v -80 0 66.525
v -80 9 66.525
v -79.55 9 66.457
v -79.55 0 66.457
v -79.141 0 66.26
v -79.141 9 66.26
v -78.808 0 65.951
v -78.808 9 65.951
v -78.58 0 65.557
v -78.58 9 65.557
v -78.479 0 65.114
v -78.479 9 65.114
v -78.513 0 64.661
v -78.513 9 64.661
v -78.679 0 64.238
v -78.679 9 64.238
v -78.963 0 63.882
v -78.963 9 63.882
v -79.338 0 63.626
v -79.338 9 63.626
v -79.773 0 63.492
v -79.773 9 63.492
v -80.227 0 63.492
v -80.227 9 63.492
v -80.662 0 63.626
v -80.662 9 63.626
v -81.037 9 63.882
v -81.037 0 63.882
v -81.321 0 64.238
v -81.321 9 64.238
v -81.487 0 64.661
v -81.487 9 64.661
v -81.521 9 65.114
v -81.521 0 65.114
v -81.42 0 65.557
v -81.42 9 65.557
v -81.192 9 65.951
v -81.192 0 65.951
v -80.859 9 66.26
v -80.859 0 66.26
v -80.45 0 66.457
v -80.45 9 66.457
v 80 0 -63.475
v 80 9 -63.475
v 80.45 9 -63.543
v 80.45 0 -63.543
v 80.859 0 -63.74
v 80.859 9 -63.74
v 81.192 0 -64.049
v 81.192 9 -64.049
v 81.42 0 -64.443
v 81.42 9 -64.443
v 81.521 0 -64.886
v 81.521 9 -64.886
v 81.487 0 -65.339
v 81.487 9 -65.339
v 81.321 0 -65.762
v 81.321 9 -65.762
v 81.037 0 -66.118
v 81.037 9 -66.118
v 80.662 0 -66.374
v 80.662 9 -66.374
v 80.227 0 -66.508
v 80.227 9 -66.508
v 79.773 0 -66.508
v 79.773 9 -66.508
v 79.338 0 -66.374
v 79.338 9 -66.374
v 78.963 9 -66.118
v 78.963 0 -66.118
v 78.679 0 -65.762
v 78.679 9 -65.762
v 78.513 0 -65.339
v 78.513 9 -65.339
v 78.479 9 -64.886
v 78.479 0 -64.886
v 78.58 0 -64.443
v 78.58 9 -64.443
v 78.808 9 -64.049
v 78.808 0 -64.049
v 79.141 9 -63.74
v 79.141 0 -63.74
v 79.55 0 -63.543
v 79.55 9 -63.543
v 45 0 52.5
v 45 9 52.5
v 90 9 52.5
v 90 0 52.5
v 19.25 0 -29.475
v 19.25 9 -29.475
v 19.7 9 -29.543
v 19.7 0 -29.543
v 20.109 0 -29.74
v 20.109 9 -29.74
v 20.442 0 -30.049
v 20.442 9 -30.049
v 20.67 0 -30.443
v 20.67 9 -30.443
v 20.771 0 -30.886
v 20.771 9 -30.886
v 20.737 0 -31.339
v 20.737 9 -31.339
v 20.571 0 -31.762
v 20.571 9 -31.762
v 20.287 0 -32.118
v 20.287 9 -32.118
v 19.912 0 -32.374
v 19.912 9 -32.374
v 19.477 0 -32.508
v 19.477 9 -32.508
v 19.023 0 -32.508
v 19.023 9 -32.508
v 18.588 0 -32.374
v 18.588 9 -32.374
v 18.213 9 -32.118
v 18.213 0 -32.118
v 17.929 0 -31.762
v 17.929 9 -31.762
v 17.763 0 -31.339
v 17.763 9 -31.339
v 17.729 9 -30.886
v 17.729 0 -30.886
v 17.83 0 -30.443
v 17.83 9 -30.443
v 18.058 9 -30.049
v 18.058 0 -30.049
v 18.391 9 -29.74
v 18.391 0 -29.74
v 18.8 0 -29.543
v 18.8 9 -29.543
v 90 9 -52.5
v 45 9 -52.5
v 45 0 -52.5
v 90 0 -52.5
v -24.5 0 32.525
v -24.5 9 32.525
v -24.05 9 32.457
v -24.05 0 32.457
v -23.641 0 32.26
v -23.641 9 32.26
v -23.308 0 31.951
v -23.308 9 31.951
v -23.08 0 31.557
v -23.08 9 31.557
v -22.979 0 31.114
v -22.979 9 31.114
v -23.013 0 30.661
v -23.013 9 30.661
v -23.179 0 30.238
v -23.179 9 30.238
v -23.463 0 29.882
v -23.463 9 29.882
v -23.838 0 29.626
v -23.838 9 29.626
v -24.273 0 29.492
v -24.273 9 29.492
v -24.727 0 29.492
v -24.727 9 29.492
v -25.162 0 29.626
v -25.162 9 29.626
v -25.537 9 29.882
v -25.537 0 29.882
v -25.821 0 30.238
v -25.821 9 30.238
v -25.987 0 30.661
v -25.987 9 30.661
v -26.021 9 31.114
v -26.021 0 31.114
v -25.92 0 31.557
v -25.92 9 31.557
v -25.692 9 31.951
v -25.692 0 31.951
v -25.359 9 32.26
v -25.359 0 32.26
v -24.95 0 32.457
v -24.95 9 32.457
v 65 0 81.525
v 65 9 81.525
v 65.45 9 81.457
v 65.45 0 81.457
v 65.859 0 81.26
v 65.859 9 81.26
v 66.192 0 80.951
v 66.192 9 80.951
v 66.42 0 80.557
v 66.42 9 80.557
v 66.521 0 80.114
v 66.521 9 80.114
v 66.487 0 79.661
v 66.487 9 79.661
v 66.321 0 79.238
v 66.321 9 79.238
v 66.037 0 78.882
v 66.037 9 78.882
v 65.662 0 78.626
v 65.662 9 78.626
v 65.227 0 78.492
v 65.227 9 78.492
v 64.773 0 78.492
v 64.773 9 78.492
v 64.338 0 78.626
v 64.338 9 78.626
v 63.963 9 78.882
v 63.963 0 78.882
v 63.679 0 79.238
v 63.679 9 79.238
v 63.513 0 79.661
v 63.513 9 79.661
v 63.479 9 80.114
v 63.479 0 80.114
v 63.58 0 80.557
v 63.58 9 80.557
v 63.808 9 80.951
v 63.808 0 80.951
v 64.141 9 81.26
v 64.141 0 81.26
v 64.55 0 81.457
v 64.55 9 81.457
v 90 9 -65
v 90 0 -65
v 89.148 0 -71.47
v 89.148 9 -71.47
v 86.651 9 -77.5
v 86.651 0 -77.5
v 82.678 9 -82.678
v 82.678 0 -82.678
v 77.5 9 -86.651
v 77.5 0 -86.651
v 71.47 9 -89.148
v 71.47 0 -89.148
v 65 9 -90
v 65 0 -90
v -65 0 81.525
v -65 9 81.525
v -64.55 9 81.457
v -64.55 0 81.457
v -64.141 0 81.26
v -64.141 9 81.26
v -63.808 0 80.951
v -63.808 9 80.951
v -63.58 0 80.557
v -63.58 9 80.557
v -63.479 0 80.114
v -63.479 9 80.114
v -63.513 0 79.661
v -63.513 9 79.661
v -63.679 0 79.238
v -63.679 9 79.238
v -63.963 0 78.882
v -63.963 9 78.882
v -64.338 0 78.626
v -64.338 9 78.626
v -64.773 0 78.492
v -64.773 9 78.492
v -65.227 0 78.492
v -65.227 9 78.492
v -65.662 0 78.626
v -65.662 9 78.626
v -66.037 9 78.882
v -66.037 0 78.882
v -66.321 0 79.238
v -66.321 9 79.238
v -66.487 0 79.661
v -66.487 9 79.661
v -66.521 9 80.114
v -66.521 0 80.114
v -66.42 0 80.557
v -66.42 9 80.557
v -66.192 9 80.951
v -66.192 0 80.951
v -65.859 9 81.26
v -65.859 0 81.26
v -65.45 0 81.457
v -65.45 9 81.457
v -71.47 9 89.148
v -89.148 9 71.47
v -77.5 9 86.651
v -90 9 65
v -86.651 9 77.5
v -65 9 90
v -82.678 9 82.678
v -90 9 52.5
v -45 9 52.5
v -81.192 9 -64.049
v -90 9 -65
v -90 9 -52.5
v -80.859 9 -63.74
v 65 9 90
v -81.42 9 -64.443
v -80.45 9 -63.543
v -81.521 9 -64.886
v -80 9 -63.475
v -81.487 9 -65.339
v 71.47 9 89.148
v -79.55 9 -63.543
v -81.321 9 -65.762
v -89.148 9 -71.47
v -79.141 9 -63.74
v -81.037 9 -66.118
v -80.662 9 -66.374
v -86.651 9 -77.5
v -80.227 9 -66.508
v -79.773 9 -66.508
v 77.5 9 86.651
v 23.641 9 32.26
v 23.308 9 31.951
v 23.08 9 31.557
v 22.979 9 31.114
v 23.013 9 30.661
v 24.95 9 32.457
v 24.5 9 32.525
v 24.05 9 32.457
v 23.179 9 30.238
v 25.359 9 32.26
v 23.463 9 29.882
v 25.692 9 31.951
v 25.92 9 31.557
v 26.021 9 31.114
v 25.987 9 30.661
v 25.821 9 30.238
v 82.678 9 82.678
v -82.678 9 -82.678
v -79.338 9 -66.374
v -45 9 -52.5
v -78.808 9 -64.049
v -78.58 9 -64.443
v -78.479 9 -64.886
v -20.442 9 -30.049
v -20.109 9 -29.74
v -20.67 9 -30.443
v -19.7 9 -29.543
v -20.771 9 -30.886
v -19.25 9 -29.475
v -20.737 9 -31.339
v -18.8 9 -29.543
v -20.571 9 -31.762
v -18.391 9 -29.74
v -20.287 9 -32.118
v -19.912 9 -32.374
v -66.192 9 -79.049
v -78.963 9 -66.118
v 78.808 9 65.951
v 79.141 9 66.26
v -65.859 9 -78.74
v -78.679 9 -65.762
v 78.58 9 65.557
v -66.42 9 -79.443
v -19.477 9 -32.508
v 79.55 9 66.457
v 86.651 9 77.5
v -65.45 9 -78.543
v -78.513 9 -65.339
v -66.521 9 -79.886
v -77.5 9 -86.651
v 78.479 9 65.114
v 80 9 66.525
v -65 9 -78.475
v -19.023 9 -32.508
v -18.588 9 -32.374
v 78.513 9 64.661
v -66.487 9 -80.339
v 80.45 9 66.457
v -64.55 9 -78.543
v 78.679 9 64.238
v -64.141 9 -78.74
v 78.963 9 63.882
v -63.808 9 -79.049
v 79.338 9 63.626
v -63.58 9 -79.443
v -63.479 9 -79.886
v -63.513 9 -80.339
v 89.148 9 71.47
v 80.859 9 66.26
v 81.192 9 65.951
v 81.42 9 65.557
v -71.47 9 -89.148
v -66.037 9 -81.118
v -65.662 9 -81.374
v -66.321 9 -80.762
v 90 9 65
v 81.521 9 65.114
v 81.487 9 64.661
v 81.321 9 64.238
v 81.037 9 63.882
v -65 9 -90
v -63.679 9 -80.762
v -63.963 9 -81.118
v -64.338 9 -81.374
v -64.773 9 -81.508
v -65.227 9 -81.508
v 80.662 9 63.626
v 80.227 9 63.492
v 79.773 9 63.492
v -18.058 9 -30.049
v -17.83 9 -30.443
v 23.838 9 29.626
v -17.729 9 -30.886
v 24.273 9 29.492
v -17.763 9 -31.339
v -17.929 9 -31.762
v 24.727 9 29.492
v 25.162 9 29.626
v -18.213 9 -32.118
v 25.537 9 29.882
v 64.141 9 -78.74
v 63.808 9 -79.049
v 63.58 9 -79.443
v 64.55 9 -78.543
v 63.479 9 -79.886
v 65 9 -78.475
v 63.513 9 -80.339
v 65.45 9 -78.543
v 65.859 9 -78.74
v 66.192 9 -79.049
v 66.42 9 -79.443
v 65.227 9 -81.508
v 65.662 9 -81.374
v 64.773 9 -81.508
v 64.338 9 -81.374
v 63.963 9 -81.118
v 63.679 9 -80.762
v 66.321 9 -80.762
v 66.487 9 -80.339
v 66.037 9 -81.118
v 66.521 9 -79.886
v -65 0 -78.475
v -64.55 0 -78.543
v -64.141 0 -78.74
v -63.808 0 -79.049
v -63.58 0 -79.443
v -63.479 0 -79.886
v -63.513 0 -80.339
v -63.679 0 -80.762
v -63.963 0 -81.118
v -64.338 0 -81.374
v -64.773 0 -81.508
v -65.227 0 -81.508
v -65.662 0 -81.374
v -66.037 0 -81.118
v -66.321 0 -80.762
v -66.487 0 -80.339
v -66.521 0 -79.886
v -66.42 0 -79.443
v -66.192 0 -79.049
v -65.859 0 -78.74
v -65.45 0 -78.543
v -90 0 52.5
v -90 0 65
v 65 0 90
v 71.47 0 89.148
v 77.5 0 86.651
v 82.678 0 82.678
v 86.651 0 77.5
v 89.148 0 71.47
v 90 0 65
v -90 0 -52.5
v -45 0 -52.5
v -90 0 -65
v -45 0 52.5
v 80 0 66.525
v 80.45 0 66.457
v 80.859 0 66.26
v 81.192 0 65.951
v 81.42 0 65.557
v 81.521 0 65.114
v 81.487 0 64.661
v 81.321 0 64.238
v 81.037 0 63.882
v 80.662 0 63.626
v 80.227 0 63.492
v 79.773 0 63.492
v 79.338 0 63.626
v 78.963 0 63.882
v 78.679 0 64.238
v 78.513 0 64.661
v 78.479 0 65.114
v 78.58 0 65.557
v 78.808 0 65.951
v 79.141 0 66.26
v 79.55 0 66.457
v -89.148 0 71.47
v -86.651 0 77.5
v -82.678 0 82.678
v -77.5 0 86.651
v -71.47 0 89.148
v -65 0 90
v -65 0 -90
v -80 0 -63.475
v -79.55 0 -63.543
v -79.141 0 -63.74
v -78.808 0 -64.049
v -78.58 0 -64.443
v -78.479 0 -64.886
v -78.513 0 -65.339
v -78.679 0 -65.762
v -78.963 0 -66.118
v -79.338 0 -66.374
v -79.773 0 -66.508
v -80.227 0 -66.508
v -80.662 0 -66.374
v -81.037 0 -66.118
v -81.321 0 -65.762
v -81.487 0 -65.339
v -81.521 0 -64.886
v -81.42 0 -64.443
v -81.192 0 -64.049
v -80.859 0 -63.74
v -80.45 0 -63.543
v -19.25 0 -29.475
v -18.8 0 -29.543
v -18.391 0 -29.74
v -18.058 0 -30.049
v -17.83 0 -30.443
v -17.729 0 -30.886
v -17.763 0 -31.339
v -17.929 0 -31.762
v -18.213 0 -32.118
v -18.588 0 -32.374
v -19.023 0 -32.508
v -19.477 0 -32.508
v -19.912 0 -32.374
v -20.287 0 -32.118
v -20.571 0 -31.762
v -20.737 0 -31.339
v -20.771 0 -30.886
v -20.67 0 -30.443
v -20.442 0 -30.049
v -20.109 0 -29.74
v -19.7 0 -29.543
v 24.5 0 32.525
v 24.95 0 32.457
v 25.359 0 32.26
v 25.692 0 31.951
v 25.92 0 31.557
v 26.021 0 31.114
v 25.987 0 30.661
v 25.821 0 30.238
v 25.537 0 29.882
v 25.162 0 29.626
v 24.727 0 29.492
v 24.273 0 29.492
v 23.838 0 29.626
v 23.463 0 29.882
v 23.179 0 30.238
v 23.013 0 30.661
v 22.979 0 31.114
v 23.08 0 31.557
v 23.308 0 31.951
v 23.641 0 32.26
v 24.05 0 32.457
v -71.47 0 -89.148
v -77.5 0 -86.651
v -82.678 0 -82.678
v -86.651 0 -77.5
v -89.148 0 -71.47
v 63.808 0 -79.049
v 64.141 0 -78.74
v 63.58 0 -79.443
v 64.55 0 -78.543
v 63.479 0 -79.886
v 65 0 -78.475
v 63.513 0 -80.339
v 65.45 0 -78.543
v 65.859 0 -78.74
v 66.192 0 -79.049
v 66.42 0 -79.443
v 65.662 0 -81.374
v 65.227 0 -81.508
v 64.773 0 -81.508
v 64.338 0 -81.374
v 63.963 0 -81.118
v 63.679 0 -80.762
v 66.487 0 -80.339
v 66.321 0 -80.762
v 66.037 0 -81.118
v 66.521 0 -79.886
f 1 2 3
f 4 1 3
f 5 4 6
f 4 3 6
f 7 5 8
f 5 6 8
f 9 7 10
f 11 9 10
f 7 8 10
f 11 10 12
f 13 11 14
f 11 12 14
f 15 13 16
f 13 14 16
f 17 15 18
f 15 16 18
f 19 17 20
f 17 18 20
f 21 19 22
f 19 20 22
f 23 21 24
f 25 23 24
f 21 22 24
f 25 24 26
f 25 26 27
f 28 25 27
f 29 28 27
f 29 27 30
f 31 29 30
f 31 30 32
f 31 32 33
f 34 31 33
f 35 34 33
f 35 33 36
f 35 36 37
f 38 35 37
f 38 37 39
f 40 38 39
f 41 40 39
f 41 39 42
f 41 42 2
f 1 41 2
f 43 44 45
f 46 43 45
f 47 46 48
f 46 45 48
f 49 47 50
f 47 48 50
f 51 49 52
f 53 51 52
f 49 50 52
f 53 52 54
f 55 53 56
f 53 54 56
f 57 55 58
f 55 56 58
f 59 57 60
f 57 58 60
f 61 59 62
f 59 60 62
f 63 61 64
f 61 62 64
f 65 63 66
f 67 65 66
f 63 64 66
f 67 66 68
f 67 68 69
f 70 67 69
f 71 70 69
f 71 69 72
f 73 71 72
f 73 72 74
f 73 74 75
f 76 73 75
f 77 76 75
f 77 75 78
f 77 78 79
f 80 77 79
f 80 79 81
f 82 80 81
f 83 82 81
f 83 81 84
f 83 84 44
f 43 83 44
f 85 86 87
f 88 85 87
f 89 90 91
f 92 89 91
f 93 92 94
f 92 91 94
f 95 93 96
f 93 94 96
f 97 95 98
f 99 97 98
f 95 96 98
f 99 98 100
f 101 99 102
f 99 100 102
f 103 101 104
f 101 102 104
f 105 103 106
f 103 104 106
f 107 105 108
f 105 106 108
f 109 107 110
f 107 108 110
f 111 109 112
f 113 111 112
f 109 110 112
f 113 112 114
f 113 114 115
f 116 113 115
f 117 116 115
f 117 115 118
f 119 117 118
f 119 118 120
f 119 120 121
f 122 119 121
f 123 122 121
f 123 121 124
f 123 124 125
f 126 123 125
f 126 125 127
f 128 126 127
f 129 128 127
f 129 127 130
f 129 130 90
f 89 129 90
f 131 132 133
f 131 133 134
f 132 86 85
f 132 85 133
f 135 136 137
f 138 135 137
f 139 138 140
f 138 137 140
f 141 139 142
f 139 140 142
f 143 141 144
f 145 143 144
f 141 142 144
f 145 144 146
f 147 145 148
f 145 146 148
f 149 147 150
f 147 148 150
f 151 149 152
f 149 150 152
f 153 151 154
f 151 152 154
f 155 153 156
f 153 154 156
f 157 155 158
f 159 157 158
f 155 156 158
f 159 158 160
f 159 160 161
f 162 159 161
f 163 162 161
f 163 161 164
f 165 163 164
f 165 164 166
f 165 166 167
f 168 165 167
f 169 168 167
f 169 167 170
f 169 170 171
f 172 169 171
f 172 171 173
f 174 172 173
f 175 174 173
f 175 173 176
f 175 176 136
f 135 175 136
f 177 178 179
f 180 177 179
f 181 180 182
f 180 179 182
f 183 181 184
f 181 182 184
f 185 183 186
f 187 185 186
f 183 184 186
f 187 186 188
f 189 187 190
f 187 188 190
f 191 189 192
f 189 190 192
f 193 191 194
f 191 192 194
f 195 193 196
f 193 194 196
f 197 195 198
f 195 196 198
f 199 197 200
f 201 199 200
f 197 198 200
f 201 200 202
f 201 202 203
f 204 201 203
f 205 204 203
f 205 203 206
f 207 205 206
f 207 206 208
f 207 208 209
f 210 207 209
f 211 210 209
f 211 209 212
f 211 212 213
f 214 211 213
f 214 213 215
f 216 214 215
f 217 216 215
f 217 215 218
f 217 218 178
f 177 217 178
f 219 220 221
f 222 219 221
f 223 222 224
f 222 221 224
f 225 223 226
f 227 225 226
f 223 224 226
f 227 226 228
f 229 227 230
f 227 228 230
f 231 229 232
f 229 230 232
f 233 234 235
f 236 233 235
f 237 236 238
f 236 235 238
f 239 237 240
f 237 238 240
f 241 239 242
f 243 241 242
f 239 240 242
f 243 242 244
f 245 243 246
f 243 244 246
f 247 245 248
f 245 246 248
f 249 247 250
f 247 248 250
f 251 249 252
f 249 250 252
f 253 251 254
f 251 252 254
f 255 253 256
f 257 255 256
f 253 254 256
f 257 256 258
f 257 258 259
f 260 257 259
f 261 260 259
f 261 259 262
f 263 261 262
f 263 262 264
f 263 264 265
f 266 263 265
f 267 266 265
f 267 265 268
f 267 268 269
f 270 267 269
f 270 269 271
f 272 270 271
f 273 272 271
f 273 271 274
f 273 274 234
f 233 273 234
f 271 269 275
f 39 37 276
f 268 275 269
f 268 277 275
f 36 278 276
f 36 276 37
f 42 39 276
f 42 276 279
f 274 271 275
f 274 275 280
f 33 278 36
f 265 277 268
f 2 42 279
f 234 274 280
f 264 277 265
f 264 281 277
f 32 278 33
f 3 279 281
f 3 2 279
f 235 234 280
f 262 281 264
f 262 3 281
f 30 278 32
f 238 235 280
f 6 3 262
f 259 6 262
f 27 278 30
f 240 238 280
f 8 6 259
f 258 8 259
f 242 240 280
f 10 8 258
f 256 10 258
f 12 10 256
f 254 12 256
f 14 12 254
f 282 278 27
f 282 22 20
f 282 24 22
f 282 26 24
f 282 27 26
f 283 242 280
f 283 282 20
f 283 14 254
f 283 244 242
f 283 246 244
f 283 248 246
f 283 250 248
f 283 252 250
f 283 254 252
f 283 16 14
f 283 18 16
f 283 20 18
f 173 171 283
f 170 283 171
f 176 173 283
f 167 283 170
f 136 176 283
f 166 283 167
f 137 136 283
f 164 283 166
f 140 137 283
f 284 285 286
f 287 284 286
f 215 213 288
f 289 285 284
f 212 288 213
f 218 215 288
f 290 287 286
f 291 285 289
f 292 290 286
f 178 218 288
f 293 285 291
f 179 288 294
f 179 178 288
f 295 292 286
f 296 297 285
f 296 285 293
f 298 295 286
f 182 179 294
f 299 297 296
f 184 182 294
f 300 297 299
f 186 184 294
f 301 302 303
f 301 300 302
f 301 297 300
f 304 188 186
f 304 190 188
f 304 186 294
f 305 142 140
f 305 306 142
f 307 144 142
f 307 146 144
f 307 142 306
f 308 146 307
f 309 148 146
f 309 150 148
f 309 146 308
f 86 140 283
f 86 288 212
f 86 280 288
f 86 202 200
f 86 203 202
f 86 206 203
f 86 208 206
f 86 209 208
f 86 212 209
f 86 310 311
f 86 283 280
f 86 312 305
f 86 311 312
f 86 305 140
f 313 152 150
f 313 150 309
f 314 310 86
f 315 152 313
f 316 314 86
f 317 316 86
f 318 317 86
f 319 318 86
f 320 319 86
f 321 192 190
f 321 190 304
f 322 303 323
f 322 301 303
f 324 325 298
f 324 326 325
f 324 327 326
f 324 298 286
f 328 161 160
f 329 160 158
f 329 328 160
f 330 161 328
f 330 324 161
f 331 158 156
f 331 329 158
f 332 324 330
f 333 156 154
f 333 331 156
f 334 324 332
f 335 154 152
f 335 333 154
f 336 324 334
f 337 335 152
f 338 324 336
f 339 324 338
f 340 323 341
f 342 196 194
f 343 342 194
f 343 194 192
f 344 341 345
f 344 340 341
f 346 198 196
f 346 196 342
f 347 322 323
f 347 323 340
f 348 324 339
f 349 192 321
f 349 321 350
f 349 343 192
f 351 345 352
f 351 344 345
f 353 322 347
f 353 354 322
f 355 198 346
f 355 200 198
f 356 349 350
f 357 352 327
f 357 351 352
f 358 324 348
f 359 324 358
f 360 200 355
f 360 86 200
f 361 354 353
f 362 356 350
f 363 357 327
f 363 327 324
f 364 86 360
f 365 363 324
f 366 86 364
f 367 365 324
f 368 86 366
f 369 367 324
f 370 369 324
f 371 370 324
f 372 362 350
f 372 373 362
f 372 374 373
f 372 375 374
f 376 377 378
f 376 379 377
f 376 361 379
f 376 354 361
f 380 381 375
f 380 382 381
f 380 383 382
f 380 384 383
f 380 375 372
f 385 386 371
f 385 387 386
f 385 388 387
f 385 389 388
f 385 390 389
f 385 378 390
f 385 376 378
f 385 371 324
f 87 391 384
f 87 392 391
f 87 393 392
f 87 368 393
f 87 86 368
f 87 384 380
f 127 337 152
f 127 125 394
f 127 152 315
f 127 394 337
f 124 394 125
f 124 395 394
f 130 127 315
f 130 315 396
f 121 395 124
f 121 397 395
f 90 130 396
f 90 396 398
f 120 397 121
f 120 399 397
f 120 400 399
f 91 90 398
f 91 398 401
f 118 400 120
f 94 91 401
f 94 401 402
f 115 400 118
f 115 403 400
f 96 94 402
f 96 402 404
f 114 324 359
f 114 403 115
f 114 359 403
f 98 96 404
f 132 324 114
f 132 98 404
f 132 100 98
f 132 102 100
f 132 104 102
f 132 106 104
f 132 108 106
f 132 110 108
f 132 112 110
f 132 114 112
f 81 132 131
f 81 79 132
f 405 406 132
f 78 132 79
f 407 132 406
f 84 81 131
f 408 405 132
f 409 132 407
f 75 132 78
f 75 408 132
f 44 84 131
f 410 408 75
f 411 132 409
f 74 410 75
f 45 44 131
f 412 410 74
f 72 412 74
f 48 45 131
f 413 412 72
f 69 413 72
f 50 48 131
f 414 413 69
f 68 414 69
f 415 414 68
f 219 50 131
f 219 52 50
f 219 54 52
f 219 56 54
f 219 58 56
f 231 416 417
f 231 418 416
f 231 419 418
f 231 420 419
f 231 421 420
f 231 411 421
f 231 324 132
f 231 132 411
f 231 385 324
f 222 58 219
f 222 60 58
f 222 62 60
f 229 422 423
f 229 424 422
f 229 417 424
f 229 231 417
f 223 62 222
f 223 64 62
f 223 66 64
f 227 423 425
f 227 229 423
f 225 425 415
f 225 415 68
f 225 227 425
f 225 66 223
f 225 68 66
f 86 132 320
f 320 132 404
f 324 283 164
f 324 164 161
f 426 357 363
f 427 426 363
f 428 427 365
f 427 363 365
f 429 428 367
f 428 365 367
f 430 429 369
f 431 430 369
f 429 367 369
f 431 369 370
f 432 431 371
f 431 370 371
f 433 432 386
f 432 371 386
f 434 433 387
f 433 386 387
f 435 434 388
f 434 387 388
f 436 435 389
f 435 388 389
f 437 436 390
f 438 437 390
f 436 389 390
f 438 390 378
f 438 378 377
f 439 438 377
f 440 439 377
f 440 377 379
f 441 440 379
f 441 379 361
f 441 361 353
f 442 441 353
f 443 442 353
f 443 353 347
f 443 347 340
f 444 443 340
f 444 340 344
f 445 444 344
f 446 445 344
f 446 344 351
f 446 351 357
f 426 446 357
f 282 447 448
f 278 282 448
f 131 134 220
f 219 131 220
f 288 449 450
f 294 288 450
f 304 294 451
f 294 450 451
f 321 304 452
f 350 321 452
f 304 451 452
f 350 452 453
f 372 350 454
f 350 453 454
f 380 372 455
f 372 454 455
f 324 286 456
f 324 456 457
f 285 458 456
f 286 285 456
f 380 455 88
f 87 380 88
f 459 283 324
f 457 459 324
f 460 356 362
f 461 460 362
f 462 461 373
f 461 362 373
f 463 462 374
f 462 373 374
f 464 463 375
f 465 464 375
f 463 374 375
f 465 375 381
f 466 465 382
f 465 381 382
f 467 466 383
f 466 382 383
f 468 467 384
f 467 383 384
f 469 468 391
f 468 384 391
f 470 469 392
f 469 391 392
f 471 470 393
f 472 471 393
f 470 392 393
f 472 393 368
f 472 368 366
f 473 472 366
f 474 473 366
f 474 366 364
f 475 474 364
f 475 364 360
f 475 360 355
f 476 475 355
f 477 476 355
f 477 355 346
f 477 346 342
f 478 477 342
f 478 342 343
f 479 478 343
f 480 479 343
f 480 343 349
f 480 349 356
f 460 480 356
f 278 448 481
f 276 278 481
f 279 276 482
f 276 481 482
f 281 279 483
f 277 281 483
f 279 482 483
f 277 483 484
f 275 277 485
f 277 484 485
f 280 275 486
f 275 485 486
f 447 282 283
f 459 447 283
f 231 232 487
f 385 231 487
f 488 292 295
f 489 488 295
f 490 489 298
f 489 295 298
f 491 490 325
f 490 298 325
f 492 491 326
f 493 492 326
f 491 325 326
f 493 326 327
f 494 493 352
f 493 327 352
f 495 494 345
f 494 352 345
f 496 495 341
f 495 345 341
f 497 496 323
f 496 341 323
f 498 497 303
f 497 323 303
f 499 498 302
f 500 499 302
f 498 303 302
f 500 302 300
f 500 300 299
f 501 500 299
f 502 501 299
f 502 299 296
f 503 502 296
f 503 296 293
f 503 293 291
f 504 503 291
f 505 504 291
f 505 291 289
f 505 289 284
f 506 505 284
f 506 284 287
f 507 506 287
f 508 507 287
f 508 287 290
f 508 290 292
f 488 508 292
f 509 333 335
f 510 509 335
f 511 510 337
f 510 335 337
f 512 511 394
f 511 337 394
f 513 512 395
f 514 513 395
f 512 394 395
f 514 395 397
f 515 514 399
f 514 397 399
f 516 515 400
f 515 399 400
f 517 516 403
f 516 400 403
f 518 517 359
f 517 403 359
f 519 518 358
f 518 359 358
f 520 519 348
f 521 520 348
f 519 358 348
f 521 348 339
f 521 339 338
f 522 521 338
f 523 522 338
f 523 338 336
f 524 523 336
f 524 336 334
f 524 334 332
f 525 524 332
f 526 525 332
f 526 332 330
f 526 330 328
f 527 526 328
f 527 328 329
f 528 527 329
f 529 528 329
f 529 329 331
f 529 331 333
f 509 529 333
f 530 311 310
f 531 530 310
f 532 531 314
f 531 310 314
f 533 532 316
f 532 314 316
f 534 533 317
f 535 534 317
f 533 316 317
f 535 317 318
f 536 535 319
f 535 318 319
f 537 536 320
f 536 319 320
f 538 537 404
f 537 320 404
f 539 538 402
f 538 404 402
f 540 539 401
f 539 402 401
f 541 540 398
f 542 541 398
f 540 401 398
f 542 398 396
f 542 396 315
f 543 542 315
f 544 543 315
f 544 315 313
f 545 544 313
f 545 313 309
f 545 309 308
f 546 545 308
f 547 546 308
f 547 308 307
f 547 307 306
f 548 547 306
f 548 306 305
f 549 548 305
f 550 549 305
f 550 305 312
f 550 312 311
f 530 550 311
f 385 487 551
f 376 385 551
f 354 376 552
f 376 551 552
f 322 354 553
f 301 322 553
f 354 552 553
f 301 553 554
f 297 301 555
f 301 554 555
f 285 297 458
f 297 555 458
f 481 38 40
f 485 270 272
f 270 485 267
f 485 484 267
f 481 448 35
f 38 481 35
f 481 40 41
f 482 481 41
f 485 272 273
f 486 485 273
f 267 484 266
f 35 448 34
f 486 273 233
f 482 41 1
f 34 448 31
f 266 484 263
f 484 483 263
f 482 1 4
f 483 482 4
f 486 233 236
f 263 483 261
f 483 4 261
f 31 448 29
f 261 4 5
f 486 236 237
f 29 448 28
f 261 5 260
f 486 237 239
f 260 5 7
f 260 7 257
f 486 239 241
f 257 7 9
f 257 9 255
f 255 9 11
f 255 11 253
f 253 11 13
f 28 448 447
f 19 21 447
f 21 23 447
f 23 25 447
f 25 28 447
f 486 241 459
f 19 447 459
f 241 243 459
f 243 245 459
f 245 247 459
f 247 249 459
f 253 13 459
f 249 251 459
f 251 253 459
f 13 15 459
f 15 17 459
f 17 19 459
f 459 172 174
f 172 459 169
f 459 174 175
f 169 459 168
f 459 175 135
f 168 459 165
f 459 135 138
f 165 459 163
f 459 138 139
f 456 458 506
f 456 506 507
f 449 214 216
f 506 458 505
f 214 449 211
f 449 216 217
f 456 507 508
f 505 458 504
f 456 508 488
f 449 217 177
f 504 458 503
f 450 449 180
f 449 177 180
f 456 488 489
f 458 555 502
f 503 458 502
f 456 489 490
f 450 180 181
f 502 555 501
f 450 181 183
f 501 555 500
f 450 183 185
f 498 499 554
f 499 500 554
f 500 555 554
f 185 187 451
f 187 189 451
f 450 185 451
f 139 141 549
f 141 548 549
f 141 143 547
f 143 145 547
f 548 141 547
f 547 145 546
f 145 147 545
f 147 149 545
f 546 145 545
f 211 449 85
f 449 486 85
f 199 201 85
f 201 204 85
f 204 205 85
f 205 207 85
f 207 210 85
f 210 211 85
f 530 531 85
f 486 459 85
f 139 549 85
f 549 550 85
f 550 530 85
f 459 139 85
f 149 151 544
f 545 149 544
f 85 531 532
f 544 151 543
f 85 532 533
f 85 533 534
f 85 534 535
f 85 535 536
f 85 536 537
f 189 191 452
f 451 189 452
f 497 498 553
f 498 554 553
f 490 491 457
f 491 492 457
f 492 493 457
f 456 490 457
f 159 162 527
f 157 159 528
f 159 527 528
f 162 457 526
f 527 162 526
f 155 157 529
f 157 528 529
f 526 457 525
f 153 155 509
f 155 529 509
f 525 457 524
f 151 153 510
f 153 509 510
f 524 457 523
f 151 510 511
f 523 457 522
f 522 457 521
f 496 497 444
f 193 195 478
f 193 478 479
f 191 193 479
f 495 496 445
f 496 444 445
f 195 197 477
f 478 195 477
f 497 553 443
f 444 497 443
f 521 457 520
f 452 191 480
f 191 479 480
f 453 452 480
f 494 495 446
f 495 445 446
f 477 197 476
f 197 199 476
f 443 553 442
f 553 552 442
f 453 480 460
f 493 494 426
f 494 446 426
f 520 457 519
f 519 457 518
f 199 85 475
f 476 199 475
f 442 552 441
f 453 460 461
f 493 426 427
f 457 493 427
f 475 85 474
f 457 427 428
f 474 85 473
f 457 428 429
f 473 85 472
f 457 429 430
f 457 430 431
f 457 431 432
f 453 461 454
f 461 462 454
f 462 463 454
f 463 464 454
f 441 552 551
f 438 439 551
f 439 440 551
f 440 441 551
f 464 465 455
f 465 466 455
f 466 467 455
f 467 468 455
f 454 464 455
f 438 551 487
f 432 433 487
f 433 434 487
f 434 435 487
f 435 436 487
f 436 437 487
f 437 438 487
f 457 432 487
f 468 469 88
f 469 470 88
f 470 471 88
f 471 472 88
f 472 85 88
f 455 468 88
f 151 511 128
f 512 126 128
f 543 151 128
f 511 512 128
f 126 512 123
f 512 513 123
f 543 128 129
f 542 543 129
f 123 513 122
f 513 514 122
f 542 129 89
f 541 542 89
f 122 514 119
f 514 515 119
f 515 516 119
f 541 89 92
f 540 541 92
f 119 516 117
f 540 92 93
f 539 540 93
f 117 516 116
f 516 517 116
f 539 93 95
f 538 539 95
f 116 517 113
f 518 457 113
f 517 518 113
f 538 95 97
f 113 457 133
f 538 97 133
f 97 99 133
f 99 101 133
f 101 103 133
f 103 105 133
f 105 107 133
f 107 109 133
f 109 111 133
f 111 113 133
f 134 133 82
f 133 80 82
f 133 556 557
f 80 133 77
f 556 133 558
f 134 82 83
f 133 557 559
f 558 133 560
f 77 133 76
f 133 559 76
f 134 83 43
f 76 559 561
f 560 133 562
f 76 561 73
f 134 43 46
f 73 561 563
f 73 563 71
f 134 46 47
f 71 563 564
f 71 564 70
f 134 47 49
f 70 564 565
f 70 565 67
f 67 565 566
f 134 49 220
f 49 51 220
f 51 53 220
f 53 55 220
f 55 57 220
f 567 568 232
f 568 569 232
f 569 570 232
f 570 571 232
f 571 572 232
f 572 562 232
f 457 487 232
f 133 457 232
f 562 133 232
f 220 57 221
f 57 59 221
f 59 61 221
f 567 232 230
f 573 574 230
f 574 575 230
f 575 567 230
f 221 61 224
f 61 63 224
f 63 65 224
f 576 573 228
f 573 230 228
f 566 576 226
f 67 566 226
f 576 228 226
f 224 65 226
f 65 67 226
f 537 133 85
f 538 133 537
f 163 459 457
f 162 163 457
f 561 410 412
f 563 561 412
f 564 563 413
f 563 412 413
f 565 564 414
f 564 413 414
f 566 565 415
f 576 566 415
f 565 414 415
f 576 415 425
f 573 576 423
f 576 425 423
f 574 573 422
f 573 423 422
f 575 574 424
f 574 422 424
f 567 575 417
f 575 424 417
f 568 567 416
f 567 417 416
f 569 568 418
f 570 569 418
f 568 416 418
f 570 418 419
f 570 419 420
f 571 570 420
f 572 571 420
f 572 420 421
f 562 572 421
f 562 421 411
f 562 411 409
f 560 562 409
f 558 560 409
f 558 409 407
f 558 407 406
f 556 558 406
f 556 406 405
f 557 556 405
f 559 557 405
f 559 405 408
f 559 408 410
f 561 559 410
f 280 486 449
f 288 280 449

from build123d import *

# Parameters (mm, degrees)
PLATE_DEPTH         = 9
SKETCH3_R           = 1.525
HEX_HOLES_DEPTH     = 128.597021909
SKETCH4_R           = 1.525
ARDUINO_HOLES_DEPTH = 128.597021909
SKETCH5_W           = 45
SKETCH5_H           = 105
CUT_EXTRUDE1_DEPTH  = 128.597021909


with BuildPart() as part:
    # Sketch1 → Plate (new body)
    with BuildSketch(Plane(origin=(0, 0, 0), x_dir=(1, 0, 0), z_dir=(0, 1, 0))):
        with BuildLine():
            Line((-65, -90), (65, -90))
            ThreePointArc((65, -90), (82.67766953, -82.67766953), (90, -65))
            Line((90, -65), (90, 65))
            ThreePointArc((90, 65), (82.67766953, 82.67766953), (65, 90))
            Line((65, 90), (-65, 90))
            ThreePointArc((-65, 90), (-82.67766953, 82.67766953), (-90, 65))
            Line((-90, 65), (-90, -65))
            ThreePointArc((-90, -65), (-82.67766953, -82.67766953), (-65, -90))
        make_face()
    extrude(amount=PLATE_DEPTH)

    # Sketch3 → Hex Holes (cut, through all)
    with BuildSketch(Plane(origin=(0, 9, 0), x_dir=(1, 0, 0), z_dir=(0, 1, 0))):
        with Locations(Location((-65, 80, 0), (0, 0, 270))):
            Circle(SKETCH3_R)
        with Locations(Location((-80, 65, 0), (0, 0, 270))):
            Circle(SKETCH3_R)
        with Locations(Location((80, 65, 0), (0, 0, 270))):
            Circle(SKETCH3_R)
        with Locations(Location((80, -65, 0), (0, 0, 270))):
            Circle(SKETCH3_R)
        with Locations(Location((65, 80, 0), (0, 0, 270))):
            Circle(SKETCH3_R)
        with Locations(Location((65, -80, 0), (0, 0, 270))):
            Circle(SKETCH3_R)
        with Locations(Location((-65, -80, 0), (0, 0, 270))):
            Circle(SKETCH3_R)
        with Locations(Location((-80, -65, 0), (0, 0, 270))):
            Circle(SKETCH3_R)
    extrude(amount=-HEX_HOLES_DEPTH, mode=Mode.SUBTRACT)

    # Sketch4 → Arduino Holes (cut, through all)
    with BuildSketch(Plane(origin=(0, 9, 0), x_dir=(1, 0, 0), z_dir=(0, 1, 0))):
        with Locations(Location((-24.5, -31, 0), (0, 0, 270))):
            Circle(SKETCH4_R)
        with Locations(Location((24.5, -31, 0), (0, 0, 270))):
            Circle(SKETCH4_R)
        with Locations(Location((-19.25, 31, 0), (0, 0, 270))):
            Circle(SKETCH4_R)
        with Locations(Location((19.25, 31, 0), (0, 0, 270))):
            Circle(SKETCH4_R)
    extrude(amount=-ARDUINO_HOLES_DEPTH, mode=Mode.SUBTRACT)

    # Sketch5 → Cut-Extrude1 (cut, through all)
    with BuildSketch(Plane(origin=(0, 9, 0), x_dir=(1, 0, 0), z_dir=(0, 1, 0))):
        with Locations((-67.5, 0)):
            Rectangle(SKETCH5_W, SKETCH5_H)
        with Locations((67.5, 0)):
            Rectangle(SKETCH5_W, SKETCH5_H)
    extrude(amount=-CUT_EXTRUDE1_DEPTH, mode=Mode.SUBTRACT)


solid = part.part
